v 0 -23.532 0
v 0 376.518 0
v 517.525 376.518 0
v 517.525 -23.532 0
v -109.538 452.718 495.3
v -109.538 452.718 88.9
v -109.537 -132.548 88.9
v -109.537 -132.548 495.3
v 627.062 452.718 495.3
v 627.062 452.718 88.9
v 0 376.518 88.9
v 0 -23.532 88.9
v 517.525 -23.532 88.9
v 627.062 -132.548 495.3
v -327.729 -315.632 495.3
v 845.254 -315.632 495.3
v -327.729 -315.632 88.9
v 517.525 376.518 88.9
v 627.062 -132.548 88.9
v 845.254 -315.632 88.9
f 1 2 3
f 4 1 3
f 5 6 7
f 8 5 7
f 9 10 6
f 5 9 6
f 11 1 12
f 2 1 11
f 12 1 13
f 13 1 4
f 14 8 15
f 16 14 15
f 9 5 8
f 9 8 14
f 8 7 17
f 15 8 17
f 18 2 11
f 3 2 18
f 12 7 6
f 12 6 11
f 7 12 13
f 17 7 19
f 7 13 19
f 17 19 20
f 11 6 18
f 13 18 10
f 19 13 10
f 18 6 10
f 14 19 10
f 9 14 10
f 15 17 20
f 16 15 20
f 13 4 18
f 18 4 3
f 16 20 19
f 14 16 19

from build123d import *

# Parameters (mm, degrees)
F0_W     = 517.525
F0_H     = 400.05
F1_DEPTH = 88.9
F3_DEPTH = 406.4


with BuildPart() as f1:
    # F0 (on Top) → F1 (new body)
    with BuildSketch(Plane.XY):
        with Locations((258.7625, 176.492612)):
            Rectangle(F0_W, F0_H)
    extrude(amount=F1_DEPTH)

    # F2 (on face) → F3 (join)
    with BuildSketch(Plane.XY.offset(88.9)):
        Polygon((-109.5375, -315.632388), (627.0625, -315.632388), (627.0625, -132.547782), (258.7625, 176.492612), (-109.5375, -132.547782), align=None)
        Polygon((627.0625, -132.547782), (627.0625, -315.632388), (845.254237, -315.632388), align=None)
        Polygon((-327.729237, -315.632388), (-109.5375, -315.632388), (-109.5375, -132.547782), align=None)
        Polygon((258.7625, 176.492612), (627.0625, -132.547782), (627.0625, 452.717612), (-109.5375, 452.717612), (-109.5375, -132.547782), align=None)
    extrude(amount=F3_DEPTH)


solid = f1.part
